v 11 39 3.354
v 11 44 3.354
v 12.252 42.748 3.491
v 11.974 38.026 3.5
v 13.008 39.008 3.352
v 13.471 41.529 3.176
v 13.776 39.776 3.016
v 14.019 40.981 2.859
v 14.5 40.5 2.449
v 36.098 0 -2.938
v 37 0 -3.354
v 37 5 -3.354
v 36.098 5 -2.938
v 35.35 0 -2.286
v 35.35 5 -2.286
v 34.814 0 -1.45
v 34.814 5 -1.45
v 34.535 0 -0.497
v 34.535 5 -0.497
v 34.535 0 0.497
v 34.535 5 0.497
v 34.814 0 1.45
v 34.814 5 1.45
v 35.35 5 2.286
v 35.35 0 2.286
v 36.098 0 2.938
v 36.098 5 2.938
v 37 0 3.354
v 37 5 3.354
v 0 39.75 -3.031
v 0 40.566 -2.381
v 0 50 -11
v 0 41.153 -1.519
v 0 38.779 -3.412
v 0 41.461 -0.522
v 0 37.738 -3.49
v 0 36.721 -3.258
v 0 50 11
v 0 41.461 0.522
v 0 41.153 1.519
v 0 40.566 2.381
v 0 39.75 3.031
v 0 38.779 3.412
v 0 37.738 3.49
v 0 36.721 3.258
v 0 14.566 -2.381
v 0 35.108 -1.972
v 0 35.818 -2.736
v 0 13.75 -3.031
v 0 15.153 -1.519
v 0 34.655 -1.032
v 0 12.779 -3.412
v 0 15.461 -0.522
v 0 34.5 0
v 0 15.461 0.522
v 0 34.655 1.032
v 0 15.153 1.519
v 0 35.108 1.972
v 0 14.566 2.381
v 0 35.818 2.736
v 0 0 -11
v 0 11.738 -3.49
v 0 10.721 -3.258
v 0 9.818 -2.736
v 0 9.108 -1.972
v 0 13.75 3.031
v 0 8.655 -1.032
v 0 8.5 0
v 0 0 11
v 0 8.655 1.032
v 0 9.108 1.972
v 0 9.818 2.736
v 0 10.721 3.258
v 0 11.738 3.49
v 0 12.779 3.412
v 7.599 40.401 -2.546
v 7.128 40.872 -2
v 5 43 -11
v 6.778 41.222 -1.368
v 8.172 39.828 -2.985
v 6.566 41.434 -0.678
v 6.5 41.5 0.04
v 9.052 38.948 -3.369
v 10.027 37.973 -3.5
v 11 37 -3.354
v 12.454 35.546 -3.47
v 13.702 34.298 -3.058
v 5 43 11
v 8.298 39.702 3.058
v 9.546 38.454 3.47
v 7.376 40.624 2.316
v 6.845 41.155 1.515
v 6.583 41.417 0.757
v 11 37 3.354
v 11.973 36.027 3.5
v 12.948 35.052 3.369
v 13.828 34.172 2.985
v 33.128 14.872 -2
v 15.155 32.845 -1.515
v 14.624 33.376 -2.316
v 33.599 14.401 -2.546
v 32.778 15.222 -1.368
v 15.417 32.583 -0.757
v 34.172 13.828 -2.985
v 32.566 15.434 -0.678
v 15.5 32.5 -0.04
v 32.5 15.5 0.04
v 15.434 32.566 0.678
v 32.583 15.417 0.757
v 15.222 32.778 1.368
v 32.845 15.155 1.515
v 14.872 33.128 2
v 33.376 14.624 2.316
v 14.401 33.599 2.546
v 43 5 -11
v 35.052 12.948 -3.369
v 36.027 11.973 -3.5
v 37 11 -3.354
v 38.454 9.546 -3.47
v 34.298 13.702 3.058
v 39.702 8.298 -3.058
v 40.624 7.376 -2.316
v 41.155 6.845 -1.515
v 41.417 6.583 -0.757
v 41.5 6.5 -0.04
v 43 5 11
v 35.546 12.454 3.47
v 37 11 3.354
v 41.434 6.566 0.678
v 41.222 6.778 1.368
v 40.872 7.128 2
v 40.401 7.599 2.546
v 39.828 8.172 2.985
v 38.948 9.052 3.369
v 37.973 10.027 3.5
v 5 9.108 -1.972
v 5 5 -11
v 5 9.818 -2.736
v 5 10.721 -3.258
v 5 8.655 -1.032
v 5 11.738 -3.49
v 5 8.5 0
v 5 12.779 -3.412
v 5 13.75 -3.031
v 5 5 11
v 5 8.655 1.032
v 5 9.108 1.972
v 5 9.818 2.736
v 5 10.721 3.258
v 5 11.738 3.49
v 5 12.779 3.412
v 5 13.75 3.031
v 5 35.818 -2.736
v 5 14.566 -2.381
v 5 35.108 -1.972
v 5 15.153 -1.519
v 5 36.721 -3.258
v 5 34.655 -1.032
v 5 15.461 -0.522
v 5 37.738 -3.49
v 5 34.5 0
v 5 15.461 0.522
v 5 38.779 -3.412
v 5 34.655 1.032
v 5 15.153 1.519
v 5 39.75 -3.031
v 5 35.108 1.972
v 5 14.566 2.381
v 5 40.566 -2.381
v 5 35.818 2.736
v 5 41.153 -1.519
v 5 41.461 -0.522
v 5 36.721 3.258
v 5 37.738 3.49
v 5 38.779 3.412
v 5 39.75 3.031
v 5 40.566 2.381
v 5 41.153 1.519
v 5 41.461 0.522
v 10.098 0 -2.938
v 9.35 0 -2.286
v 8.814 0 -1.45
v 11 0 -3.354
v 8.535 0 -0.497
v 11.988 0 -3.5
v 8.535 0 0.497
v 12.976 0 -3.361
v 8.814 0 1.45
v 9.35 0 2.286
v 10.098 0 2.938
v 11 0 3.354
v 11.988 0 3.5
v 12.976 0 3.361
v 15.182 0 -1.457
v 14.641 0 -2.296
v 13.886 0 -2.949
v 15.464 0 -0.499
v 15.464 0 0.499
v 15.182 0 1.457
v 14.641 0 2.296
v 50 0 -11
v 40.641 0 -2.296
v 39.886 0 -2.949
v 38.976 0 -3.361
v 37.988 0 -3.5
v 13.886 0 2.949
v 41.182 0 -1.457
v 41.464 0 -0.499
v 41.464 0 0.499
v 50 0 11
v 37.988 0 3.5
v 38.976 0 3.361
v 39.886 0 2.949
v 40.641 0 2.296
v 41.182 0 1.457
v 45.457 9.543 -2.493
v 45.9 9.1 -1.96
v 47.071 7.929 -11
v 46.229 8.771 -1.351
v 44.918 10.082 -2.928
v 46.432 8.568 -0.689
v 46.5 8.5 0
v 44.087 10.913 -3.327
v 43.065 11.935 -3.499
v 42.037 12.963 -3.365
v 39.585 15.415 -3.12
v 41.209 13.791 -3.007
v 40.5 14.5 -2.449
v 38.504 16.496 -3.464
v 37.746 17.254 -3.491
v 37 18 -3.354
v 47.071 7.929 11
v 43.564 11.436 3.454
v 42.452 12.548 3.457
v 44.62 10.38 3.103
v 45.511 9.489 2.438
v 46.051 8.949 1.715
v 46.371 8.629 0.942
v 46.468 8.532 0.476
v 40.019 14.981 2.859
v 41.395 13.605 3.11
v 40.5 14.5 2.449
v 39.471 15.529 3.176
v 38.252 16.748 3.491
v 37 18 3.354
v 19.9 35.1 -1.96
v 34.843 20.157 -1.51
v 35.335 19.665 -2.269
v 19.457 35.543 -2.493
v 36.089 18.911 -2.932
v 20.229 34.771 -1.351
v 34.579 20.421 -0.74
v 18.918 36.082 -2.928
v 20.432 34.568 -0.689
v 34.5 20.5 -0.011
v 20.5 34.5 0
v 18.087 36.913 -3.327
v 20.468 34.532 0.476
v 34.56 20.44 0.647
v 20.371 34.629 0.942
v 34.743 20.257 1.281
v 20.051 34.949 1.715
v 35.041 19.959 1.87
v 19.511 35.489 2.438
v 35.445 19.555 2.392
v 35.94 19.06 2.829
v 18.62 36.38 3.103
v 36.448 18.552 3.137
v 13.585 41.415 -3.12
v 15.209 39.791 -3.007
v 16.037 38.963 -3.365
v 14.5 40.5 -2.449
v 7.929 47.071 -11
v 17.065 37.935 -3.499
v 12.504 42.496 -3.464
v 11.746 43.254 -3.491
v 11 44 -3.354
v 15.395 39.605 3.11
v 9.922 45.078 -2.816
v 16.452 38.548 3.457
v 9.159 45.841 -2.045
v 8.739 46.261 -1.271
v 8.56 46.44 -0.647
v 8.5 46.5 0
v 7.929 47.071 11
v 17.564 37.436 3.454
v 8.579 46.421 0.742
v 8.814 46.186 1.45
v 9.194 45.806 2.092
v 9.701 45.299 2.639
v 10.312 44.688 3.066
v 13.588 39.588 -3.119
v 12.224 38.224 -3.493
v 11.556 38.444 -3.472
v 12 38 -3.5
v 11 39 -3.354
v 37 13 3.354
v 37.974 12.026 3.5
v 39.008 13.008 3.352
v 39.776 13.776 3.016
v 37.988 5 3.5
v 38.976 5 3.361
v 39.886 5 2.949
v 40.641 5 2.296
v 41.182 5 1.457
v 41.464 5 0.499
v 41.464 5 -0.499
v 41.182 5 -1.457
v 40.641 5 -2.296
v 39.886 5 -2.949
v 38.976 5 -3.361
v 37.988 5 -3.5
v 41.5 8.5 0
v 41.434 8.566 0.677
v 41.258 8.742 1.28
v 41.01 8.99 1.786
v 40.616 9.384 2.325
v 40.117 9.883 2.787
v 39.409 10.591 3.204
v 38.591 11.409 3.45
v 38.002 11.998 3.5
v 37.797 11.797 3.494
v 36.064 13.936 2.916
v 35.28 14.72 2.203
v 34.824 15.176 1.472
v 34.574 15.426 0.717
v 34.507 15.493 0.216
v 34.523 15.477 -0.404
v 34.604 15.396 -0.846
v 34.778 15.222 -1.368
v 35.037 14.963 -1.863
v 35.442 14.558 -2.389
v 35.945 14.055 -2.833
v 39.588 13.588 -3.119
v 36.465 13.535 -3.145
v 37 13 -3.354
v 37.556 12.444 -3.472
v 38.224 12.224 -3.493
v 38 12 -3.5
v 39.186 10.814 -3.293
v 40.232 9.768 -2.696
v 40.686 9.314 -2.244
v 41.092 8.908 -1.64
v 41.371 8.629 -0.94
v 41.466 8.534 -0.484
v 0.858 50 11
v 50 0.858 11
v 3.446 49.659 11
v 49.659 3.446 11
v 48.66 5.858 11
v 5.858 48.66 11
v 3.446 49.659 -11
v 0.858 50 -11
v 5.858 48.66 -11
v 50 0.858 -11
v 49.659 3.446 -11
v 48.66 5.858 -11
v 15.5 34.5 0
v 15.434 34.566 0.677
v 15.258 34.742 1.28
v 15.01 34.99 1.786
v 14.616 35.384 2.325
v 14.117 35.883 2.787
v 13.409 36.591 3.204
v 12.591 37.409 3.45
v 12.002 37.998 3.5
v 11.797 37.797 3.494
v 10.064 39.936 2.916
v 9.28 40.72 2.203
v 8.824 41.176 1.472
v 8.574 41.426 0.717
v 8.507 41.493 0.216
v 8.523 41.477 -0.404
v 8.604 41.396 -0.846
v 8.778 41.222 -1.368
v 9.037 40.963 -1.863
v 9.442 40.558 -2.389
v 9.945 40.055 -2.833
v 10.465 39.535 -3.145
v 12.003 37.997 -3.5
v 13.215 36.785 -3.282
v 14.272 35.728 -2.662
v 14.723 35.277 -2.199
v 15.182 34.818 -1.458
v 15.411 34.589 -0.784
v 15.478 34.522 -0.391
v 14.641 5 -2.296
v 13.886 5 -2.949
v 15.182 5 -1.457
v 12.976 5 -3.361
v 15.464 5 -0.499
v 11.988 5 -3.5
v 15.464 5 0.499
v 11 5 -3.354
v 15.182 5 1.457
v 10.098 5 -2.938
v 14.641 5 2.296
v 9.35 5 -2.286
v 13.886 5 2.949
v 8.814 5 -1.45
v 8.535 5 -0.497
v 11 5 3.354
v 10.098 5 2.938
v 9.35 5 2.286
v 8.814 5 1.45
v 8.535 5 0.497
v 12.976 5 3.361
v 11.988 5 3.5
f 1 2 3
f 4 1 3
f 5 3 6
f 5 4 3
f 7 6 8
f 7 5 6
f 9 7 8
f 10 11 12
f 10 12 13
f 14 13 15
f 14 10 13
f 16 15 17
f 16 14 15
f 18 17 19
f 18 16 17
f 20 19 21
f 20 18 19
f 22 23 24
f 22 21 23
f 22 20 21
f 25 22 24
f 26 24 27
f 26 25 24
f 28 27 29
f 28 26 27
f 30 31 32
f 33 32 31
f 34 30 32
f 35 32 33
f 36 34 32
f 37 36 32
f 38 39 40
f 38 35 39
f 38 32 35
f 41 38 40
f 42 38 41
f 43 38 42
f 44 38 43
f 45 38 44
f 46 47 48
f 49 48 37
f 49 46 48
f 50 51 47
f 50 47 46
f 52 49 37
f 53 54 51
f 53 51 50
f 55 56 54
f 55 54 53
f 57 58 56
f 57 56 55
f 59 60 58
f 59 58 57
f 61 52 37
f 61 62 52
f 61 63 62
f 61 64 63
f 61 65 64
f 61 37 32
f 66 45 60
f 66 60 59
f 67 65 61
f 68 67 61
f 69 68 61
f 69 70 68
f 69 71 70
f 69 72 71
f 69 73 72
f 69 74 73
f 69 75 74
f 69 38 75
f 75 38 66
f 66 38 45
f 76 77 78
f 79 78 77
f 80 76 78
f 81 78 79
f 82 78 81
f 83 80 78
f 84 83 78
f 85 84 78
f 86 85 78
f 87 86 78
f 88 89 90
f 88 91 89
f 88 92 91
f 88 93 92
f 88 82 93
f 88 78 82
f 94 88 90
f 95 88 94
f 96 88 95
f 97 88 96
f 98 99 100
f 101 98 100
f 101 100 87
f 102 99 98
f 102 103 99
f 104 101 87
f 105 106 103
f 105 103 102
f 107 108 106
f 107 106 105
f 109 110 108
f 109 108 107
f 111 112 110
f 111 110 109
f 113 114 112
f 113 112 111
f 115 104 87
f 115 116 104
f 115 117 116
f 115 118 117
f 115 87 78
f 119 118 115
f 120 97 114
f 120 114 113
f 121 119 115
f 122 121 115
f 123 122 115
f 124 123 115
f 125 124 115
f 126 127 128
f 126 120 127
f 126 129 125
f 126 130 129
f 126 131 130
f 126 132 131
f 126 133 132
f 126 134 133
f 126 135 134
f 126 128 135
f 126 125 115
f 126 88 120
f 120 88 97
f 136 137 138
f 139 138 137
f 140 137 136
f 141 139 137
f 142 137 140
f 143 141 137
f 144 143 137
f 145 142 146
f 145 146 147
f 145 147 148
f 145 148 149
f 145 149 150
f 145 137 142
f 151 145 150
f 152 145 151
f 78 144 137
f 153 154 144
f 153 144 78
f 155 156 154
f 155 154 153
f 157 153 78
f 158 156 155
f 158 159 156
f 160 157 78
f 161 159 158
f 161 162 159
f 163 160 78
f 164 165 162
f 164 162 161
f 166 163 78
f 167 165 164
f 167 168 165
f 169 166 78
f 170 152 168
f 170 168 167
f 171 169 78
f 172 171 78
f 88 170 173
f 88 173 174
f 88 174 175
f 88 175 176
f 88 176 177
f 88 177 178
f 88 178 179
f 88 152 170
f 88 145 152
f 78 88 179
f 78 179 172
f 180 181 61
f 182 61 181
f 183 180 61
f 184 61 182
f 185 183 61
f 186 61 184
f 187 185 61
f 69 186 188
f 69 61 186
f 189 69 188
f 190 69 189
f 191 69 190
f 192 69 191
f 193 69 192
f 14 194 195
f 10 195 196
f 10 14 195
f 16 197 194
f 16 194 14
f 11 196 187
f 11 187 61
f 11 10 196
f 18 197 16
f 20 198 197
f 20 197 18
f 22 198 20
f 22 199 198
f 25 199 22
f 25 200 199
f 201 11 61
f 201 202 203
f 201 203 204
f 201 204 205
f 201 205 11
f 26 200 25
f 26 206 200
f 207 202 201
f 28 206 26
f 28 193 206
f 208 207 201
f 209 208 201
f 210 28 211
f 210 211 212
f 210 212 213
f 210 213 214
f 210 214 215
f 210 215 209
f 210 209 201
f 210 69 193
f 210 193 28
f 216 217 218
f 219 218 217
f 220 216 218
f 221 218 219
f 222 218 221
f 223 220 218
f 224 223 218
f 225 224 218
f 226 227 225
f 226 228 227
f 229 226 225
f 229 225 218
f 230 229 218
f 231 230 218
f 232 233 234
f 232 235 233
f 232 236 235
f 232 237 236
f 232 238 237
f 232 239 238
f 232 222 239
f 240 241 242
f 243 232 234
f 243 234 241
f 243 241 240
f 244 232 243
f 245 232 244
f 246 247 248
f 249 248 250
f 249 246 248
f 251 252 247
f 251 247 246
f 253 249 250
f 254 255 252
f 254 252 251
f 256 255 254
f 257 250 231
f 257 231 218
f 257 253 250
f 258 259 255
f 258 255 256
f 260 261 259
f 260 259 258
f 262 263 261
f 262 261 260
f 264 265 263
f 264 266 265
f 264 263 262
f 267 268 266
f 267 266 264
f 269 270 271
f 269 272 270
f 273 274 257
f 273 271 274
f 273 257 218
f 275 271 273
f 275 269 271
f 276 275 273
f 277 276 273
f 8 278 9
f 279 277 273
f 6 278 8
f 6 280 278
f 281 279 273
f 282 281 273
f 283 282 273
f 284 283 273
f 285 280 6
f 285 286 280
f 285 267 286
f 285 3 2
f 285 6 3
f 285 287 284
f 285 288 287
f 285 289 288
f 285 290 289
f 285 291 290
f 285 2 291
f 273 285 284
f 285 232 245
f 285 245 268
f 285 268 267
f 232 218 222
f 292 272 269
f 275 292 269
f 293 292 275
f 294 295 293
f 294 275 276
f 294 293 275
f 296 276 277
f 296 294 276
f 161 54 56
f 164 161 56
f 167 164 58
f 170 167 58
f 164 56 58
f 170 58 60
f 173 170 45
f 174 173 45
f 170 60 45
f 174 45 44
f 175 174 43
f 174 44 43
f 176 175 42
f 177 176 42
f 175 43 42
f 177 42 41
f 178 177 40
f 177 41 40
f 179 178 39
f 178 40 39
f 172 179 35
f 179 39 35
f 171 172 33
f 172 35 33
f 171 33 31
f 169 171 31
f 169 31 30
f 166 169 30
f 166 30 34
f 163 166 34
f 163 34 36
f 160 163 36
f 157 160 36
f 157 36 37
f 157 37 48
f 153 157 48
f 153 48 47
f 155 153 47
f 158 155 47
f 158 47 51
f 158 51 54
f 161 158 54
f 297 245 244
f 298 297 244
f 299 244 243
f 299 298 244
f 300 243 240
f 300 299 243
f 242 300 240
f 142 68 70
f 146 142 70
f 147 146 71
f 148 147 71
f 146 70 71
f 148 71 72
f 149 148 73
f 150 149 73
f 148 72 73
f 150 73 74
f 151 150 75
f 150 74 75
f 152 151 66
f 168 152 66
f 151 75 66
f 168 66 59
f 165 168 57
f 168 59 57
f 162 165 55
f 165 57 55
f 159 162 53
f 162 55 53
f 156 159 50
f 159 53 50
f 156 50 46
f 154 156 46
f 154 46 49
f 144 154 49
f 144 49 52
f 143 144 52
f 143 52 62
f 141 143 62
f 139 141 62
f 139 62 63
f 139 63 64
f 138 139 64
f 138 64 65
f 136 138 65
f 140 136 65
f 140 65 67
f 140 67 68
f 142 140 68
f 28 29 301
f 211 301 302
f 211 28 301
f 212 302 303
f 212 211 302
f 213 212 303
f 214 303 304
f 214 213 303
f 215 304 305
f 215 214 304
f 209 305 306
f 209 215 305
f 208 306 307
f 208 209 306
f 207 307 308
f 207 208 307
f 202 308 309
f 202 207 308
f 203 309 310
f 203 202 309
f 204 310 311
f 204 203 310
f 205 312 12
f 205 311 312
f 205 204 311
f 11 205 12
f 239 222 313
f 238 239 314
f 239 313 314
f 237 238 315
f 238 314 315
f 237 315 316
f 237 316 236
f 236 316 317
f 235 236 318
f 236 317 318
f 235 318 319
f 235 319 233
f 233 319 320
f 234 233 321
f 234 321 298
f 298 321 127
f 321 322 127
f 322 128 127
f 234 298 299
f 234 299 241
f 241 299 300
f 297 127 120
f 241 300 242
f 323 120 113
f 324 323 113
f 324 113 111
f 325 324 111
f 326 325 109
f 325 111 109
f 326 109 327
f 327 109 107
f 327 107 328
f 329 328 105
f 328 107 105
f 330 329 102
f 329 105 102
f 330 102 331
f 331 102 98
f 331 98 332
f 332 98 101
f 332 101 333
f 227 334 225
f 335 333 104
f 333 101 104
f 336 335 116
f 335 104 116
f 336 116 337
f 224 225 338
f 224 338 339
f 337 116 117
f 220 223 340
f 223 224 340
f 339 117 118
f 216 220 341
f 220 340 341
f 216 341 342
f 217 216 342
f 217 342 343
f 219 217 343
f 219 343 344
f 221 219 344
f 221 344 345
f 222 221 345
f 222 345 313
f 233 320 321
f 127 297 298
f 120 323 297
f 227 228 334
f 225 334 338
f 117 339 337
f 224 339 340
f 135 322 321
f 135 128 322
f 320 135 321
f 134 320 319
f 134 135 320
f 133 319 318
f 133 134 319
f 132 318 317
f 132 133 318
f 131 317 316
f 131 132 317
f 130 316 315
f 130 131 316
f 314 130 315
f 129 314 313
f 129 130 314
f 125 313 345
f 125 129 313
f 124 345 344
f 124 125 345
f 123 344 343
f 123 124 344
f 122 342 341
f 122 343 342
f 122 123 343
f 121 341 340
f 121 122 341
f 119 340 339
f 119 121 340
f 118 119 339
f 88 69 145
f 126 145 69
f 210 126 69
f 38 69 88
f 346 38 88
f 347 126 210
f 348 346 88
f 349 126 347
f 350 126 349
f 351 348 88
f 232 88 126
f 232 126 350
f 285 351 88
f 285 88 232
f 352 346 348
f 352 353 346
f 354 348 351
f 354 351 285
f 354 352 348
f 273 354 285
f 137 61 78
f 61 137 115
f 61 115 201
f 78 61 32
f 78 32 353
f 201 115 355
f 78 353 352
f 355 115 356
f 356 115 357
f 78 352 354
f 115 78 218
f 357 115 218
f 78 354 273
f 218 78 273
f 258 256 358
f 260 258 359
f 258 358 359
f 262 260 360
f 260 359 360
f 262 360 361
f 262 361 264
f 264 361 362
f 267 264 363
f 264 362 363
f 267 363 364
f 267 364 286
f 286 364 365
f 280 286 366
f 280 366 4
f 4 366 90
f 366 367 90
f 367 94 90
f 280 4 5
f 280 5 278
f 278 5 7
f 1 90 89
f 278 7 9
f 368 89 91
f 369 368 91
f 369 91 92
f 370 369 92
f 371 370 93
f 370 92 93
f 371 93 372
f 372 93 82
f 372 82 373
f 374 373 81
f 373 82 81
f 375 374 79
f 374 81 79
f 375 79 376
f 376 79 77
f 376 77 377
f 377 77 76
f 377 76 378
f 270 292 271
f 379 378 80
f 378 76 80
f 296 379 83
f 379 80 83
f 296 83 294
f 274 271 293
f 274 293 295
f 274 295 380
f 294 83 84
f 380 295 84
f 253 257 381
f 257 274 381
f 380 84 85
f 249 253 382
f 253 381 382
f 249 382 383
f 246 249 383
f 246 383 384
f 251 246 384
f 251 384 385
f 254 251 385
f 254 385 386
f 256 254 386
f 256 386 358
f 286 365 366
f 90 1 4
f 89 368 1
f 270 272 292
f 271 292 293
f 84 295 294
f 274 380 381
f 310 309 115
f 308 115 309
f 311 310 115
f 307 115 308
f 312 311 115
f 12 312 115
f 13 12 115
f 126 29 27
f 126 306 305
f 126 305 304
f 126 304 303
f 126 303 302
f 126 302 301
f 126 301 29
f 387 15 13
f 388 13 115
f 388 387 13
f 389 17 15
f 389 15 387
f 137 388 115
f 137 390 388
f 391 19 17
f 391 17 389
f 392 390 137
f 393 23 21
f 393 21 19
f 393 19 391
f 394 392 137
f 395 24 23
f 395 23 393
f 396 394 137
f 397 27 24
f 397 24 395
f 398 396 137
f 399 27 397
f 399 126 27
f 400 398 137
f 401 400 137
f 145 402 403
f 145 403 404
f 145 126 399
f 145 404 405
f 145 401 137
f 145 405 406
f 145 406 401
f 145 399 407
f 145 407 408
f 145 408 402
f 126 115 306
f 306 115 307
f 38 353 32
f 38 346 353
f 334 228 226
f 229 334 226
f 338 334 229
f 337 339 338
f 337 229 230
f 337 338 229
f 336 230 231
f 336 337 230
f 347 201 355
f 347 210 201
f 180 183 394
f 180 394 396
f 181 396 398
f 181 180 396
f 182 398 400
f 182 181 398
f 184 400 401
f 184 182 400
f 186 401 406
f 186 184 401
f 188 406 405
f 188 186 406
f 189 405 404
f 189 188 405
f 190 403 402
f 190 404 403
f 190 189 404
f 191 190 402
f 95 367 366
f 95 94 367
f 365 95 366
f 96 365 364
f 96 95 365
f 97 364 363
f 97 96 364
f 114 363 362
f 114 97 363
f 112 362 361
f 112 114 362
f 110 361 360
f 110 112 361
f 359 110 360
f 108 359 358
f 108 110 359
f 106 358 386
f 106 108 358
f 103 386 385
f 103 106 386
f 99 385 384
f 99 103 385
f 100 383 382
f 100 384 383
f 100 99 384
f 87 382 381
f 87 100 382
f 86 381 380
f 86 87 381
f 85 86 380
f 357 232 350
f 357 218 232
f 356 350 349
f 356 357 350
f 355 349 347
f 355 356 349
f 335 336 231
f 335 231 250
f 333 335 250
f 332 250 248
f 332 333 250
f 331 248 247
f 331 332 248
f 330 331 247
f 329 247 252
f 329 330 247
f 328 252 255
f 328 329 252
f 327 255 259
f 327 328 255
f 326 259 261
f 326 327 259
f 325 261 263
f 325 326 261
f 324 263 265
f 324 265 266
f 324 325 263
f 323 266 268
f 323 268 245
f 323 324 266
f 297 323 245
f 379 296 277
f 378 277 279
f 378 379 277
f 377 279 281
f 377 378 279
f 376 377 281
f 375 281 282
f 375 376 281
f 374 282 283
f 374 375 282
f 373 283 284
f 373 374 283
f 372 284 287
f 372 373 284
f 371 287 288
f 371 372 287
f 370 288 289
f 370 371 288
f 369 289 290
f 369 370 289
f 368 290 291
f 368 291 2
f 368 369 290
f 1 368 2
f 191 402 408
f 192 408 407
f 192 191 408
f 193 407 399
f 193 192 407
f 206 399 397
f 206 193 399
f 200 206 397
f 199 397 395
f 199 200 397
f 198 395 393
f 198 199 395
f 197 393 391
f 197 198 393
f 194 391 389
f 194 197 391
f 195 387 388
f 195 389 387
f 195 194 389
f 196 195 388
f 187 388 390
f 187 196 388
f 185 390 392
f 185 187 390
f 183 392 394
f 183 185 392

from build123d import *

# Parameters (mm, degrees)
BOSS_EXTRUDE1_DEPTH = 11
FILLET1_R           = 10
FILLET2_R           = 10
SKETCH2_R           = 3.5
CUT_EXTRUDE2_DEPTH  = 72.561162651
CUT_EXTRUDE3_DEPTH  = 46.5


# Read off the part's stored shape, not the designer's step: Cut-Extrude3
with BuildPart() as part:
    # Sketch1 → Boss-Extrude1 (new, symmetric)
    with BuildSketch(Plane.XY):
        Polygon((0, 50), (0, 0), (50, 0), (50, 5), (5, 50), align=None)
        Polygon((43, 5), (5, 5), (5, 43), align=None, mode=Mode.SUBTRACT)
    extrude(amount=BOSS_EXTRUDE1_DEPTH, both=True)

    # Fillet1
    fillet1_edges = [part.edges().sort_by_distance(p)[0] for p in [
        (5, 50, 0),
    ]]
    fillet(fillet1_edges, radius=FILLET1_R)

    # Fillet2
    fillet2_edges = [part.edges().sort_by_distance(p)[0] for p in [
        (50, 5, 0),
    ]]
    fillet(fillet2_edges, radius=FILLET2_R)

    # Sketch2 → Cut-Extrude2 (cut, through all)
    with BuildSketch(Plane.ZY):
        with Locations(Location((0, 38, 0), (0, 0, 270))):
            Circle(SKETCH2_R)
        with Locations(Location((0, 12, 0), (0, 0, 270))):
            Circle(SKETCH2_R)
    extrude(amount=-CUT_EXTRUDE2_DEPTH, mode=Mode.SUBTRACT)

    # Cut-Extrude3 outline → Cut-Extrude3 (cut)
    with BuildSketch(Plane(origin=(0, 0, 0), x_dir=(1, 0, 0), z_dir=(0, 1, 0))):
        with BuildLine():
            ThreePointArc((11, -3.354101966), (15.5, 0), (11, 3.354101966))
            ThreePointArc((11, 3.354101966), (8.5, 0), (11, -3.354101966))
        make_face()
        with BuildLine():
            ThreePointArc((37, -3.354101966), (41.5, 0), (37, 3.354101966))
            ThreePointArc((37, 3.354101966), (34.5, 0), (37, -3.354101966))
        make_face()
    extrude(amount=CUT_EXTRUDE3_DEPTH, mode=Mode.SUBTRACT)


solid = part.part
